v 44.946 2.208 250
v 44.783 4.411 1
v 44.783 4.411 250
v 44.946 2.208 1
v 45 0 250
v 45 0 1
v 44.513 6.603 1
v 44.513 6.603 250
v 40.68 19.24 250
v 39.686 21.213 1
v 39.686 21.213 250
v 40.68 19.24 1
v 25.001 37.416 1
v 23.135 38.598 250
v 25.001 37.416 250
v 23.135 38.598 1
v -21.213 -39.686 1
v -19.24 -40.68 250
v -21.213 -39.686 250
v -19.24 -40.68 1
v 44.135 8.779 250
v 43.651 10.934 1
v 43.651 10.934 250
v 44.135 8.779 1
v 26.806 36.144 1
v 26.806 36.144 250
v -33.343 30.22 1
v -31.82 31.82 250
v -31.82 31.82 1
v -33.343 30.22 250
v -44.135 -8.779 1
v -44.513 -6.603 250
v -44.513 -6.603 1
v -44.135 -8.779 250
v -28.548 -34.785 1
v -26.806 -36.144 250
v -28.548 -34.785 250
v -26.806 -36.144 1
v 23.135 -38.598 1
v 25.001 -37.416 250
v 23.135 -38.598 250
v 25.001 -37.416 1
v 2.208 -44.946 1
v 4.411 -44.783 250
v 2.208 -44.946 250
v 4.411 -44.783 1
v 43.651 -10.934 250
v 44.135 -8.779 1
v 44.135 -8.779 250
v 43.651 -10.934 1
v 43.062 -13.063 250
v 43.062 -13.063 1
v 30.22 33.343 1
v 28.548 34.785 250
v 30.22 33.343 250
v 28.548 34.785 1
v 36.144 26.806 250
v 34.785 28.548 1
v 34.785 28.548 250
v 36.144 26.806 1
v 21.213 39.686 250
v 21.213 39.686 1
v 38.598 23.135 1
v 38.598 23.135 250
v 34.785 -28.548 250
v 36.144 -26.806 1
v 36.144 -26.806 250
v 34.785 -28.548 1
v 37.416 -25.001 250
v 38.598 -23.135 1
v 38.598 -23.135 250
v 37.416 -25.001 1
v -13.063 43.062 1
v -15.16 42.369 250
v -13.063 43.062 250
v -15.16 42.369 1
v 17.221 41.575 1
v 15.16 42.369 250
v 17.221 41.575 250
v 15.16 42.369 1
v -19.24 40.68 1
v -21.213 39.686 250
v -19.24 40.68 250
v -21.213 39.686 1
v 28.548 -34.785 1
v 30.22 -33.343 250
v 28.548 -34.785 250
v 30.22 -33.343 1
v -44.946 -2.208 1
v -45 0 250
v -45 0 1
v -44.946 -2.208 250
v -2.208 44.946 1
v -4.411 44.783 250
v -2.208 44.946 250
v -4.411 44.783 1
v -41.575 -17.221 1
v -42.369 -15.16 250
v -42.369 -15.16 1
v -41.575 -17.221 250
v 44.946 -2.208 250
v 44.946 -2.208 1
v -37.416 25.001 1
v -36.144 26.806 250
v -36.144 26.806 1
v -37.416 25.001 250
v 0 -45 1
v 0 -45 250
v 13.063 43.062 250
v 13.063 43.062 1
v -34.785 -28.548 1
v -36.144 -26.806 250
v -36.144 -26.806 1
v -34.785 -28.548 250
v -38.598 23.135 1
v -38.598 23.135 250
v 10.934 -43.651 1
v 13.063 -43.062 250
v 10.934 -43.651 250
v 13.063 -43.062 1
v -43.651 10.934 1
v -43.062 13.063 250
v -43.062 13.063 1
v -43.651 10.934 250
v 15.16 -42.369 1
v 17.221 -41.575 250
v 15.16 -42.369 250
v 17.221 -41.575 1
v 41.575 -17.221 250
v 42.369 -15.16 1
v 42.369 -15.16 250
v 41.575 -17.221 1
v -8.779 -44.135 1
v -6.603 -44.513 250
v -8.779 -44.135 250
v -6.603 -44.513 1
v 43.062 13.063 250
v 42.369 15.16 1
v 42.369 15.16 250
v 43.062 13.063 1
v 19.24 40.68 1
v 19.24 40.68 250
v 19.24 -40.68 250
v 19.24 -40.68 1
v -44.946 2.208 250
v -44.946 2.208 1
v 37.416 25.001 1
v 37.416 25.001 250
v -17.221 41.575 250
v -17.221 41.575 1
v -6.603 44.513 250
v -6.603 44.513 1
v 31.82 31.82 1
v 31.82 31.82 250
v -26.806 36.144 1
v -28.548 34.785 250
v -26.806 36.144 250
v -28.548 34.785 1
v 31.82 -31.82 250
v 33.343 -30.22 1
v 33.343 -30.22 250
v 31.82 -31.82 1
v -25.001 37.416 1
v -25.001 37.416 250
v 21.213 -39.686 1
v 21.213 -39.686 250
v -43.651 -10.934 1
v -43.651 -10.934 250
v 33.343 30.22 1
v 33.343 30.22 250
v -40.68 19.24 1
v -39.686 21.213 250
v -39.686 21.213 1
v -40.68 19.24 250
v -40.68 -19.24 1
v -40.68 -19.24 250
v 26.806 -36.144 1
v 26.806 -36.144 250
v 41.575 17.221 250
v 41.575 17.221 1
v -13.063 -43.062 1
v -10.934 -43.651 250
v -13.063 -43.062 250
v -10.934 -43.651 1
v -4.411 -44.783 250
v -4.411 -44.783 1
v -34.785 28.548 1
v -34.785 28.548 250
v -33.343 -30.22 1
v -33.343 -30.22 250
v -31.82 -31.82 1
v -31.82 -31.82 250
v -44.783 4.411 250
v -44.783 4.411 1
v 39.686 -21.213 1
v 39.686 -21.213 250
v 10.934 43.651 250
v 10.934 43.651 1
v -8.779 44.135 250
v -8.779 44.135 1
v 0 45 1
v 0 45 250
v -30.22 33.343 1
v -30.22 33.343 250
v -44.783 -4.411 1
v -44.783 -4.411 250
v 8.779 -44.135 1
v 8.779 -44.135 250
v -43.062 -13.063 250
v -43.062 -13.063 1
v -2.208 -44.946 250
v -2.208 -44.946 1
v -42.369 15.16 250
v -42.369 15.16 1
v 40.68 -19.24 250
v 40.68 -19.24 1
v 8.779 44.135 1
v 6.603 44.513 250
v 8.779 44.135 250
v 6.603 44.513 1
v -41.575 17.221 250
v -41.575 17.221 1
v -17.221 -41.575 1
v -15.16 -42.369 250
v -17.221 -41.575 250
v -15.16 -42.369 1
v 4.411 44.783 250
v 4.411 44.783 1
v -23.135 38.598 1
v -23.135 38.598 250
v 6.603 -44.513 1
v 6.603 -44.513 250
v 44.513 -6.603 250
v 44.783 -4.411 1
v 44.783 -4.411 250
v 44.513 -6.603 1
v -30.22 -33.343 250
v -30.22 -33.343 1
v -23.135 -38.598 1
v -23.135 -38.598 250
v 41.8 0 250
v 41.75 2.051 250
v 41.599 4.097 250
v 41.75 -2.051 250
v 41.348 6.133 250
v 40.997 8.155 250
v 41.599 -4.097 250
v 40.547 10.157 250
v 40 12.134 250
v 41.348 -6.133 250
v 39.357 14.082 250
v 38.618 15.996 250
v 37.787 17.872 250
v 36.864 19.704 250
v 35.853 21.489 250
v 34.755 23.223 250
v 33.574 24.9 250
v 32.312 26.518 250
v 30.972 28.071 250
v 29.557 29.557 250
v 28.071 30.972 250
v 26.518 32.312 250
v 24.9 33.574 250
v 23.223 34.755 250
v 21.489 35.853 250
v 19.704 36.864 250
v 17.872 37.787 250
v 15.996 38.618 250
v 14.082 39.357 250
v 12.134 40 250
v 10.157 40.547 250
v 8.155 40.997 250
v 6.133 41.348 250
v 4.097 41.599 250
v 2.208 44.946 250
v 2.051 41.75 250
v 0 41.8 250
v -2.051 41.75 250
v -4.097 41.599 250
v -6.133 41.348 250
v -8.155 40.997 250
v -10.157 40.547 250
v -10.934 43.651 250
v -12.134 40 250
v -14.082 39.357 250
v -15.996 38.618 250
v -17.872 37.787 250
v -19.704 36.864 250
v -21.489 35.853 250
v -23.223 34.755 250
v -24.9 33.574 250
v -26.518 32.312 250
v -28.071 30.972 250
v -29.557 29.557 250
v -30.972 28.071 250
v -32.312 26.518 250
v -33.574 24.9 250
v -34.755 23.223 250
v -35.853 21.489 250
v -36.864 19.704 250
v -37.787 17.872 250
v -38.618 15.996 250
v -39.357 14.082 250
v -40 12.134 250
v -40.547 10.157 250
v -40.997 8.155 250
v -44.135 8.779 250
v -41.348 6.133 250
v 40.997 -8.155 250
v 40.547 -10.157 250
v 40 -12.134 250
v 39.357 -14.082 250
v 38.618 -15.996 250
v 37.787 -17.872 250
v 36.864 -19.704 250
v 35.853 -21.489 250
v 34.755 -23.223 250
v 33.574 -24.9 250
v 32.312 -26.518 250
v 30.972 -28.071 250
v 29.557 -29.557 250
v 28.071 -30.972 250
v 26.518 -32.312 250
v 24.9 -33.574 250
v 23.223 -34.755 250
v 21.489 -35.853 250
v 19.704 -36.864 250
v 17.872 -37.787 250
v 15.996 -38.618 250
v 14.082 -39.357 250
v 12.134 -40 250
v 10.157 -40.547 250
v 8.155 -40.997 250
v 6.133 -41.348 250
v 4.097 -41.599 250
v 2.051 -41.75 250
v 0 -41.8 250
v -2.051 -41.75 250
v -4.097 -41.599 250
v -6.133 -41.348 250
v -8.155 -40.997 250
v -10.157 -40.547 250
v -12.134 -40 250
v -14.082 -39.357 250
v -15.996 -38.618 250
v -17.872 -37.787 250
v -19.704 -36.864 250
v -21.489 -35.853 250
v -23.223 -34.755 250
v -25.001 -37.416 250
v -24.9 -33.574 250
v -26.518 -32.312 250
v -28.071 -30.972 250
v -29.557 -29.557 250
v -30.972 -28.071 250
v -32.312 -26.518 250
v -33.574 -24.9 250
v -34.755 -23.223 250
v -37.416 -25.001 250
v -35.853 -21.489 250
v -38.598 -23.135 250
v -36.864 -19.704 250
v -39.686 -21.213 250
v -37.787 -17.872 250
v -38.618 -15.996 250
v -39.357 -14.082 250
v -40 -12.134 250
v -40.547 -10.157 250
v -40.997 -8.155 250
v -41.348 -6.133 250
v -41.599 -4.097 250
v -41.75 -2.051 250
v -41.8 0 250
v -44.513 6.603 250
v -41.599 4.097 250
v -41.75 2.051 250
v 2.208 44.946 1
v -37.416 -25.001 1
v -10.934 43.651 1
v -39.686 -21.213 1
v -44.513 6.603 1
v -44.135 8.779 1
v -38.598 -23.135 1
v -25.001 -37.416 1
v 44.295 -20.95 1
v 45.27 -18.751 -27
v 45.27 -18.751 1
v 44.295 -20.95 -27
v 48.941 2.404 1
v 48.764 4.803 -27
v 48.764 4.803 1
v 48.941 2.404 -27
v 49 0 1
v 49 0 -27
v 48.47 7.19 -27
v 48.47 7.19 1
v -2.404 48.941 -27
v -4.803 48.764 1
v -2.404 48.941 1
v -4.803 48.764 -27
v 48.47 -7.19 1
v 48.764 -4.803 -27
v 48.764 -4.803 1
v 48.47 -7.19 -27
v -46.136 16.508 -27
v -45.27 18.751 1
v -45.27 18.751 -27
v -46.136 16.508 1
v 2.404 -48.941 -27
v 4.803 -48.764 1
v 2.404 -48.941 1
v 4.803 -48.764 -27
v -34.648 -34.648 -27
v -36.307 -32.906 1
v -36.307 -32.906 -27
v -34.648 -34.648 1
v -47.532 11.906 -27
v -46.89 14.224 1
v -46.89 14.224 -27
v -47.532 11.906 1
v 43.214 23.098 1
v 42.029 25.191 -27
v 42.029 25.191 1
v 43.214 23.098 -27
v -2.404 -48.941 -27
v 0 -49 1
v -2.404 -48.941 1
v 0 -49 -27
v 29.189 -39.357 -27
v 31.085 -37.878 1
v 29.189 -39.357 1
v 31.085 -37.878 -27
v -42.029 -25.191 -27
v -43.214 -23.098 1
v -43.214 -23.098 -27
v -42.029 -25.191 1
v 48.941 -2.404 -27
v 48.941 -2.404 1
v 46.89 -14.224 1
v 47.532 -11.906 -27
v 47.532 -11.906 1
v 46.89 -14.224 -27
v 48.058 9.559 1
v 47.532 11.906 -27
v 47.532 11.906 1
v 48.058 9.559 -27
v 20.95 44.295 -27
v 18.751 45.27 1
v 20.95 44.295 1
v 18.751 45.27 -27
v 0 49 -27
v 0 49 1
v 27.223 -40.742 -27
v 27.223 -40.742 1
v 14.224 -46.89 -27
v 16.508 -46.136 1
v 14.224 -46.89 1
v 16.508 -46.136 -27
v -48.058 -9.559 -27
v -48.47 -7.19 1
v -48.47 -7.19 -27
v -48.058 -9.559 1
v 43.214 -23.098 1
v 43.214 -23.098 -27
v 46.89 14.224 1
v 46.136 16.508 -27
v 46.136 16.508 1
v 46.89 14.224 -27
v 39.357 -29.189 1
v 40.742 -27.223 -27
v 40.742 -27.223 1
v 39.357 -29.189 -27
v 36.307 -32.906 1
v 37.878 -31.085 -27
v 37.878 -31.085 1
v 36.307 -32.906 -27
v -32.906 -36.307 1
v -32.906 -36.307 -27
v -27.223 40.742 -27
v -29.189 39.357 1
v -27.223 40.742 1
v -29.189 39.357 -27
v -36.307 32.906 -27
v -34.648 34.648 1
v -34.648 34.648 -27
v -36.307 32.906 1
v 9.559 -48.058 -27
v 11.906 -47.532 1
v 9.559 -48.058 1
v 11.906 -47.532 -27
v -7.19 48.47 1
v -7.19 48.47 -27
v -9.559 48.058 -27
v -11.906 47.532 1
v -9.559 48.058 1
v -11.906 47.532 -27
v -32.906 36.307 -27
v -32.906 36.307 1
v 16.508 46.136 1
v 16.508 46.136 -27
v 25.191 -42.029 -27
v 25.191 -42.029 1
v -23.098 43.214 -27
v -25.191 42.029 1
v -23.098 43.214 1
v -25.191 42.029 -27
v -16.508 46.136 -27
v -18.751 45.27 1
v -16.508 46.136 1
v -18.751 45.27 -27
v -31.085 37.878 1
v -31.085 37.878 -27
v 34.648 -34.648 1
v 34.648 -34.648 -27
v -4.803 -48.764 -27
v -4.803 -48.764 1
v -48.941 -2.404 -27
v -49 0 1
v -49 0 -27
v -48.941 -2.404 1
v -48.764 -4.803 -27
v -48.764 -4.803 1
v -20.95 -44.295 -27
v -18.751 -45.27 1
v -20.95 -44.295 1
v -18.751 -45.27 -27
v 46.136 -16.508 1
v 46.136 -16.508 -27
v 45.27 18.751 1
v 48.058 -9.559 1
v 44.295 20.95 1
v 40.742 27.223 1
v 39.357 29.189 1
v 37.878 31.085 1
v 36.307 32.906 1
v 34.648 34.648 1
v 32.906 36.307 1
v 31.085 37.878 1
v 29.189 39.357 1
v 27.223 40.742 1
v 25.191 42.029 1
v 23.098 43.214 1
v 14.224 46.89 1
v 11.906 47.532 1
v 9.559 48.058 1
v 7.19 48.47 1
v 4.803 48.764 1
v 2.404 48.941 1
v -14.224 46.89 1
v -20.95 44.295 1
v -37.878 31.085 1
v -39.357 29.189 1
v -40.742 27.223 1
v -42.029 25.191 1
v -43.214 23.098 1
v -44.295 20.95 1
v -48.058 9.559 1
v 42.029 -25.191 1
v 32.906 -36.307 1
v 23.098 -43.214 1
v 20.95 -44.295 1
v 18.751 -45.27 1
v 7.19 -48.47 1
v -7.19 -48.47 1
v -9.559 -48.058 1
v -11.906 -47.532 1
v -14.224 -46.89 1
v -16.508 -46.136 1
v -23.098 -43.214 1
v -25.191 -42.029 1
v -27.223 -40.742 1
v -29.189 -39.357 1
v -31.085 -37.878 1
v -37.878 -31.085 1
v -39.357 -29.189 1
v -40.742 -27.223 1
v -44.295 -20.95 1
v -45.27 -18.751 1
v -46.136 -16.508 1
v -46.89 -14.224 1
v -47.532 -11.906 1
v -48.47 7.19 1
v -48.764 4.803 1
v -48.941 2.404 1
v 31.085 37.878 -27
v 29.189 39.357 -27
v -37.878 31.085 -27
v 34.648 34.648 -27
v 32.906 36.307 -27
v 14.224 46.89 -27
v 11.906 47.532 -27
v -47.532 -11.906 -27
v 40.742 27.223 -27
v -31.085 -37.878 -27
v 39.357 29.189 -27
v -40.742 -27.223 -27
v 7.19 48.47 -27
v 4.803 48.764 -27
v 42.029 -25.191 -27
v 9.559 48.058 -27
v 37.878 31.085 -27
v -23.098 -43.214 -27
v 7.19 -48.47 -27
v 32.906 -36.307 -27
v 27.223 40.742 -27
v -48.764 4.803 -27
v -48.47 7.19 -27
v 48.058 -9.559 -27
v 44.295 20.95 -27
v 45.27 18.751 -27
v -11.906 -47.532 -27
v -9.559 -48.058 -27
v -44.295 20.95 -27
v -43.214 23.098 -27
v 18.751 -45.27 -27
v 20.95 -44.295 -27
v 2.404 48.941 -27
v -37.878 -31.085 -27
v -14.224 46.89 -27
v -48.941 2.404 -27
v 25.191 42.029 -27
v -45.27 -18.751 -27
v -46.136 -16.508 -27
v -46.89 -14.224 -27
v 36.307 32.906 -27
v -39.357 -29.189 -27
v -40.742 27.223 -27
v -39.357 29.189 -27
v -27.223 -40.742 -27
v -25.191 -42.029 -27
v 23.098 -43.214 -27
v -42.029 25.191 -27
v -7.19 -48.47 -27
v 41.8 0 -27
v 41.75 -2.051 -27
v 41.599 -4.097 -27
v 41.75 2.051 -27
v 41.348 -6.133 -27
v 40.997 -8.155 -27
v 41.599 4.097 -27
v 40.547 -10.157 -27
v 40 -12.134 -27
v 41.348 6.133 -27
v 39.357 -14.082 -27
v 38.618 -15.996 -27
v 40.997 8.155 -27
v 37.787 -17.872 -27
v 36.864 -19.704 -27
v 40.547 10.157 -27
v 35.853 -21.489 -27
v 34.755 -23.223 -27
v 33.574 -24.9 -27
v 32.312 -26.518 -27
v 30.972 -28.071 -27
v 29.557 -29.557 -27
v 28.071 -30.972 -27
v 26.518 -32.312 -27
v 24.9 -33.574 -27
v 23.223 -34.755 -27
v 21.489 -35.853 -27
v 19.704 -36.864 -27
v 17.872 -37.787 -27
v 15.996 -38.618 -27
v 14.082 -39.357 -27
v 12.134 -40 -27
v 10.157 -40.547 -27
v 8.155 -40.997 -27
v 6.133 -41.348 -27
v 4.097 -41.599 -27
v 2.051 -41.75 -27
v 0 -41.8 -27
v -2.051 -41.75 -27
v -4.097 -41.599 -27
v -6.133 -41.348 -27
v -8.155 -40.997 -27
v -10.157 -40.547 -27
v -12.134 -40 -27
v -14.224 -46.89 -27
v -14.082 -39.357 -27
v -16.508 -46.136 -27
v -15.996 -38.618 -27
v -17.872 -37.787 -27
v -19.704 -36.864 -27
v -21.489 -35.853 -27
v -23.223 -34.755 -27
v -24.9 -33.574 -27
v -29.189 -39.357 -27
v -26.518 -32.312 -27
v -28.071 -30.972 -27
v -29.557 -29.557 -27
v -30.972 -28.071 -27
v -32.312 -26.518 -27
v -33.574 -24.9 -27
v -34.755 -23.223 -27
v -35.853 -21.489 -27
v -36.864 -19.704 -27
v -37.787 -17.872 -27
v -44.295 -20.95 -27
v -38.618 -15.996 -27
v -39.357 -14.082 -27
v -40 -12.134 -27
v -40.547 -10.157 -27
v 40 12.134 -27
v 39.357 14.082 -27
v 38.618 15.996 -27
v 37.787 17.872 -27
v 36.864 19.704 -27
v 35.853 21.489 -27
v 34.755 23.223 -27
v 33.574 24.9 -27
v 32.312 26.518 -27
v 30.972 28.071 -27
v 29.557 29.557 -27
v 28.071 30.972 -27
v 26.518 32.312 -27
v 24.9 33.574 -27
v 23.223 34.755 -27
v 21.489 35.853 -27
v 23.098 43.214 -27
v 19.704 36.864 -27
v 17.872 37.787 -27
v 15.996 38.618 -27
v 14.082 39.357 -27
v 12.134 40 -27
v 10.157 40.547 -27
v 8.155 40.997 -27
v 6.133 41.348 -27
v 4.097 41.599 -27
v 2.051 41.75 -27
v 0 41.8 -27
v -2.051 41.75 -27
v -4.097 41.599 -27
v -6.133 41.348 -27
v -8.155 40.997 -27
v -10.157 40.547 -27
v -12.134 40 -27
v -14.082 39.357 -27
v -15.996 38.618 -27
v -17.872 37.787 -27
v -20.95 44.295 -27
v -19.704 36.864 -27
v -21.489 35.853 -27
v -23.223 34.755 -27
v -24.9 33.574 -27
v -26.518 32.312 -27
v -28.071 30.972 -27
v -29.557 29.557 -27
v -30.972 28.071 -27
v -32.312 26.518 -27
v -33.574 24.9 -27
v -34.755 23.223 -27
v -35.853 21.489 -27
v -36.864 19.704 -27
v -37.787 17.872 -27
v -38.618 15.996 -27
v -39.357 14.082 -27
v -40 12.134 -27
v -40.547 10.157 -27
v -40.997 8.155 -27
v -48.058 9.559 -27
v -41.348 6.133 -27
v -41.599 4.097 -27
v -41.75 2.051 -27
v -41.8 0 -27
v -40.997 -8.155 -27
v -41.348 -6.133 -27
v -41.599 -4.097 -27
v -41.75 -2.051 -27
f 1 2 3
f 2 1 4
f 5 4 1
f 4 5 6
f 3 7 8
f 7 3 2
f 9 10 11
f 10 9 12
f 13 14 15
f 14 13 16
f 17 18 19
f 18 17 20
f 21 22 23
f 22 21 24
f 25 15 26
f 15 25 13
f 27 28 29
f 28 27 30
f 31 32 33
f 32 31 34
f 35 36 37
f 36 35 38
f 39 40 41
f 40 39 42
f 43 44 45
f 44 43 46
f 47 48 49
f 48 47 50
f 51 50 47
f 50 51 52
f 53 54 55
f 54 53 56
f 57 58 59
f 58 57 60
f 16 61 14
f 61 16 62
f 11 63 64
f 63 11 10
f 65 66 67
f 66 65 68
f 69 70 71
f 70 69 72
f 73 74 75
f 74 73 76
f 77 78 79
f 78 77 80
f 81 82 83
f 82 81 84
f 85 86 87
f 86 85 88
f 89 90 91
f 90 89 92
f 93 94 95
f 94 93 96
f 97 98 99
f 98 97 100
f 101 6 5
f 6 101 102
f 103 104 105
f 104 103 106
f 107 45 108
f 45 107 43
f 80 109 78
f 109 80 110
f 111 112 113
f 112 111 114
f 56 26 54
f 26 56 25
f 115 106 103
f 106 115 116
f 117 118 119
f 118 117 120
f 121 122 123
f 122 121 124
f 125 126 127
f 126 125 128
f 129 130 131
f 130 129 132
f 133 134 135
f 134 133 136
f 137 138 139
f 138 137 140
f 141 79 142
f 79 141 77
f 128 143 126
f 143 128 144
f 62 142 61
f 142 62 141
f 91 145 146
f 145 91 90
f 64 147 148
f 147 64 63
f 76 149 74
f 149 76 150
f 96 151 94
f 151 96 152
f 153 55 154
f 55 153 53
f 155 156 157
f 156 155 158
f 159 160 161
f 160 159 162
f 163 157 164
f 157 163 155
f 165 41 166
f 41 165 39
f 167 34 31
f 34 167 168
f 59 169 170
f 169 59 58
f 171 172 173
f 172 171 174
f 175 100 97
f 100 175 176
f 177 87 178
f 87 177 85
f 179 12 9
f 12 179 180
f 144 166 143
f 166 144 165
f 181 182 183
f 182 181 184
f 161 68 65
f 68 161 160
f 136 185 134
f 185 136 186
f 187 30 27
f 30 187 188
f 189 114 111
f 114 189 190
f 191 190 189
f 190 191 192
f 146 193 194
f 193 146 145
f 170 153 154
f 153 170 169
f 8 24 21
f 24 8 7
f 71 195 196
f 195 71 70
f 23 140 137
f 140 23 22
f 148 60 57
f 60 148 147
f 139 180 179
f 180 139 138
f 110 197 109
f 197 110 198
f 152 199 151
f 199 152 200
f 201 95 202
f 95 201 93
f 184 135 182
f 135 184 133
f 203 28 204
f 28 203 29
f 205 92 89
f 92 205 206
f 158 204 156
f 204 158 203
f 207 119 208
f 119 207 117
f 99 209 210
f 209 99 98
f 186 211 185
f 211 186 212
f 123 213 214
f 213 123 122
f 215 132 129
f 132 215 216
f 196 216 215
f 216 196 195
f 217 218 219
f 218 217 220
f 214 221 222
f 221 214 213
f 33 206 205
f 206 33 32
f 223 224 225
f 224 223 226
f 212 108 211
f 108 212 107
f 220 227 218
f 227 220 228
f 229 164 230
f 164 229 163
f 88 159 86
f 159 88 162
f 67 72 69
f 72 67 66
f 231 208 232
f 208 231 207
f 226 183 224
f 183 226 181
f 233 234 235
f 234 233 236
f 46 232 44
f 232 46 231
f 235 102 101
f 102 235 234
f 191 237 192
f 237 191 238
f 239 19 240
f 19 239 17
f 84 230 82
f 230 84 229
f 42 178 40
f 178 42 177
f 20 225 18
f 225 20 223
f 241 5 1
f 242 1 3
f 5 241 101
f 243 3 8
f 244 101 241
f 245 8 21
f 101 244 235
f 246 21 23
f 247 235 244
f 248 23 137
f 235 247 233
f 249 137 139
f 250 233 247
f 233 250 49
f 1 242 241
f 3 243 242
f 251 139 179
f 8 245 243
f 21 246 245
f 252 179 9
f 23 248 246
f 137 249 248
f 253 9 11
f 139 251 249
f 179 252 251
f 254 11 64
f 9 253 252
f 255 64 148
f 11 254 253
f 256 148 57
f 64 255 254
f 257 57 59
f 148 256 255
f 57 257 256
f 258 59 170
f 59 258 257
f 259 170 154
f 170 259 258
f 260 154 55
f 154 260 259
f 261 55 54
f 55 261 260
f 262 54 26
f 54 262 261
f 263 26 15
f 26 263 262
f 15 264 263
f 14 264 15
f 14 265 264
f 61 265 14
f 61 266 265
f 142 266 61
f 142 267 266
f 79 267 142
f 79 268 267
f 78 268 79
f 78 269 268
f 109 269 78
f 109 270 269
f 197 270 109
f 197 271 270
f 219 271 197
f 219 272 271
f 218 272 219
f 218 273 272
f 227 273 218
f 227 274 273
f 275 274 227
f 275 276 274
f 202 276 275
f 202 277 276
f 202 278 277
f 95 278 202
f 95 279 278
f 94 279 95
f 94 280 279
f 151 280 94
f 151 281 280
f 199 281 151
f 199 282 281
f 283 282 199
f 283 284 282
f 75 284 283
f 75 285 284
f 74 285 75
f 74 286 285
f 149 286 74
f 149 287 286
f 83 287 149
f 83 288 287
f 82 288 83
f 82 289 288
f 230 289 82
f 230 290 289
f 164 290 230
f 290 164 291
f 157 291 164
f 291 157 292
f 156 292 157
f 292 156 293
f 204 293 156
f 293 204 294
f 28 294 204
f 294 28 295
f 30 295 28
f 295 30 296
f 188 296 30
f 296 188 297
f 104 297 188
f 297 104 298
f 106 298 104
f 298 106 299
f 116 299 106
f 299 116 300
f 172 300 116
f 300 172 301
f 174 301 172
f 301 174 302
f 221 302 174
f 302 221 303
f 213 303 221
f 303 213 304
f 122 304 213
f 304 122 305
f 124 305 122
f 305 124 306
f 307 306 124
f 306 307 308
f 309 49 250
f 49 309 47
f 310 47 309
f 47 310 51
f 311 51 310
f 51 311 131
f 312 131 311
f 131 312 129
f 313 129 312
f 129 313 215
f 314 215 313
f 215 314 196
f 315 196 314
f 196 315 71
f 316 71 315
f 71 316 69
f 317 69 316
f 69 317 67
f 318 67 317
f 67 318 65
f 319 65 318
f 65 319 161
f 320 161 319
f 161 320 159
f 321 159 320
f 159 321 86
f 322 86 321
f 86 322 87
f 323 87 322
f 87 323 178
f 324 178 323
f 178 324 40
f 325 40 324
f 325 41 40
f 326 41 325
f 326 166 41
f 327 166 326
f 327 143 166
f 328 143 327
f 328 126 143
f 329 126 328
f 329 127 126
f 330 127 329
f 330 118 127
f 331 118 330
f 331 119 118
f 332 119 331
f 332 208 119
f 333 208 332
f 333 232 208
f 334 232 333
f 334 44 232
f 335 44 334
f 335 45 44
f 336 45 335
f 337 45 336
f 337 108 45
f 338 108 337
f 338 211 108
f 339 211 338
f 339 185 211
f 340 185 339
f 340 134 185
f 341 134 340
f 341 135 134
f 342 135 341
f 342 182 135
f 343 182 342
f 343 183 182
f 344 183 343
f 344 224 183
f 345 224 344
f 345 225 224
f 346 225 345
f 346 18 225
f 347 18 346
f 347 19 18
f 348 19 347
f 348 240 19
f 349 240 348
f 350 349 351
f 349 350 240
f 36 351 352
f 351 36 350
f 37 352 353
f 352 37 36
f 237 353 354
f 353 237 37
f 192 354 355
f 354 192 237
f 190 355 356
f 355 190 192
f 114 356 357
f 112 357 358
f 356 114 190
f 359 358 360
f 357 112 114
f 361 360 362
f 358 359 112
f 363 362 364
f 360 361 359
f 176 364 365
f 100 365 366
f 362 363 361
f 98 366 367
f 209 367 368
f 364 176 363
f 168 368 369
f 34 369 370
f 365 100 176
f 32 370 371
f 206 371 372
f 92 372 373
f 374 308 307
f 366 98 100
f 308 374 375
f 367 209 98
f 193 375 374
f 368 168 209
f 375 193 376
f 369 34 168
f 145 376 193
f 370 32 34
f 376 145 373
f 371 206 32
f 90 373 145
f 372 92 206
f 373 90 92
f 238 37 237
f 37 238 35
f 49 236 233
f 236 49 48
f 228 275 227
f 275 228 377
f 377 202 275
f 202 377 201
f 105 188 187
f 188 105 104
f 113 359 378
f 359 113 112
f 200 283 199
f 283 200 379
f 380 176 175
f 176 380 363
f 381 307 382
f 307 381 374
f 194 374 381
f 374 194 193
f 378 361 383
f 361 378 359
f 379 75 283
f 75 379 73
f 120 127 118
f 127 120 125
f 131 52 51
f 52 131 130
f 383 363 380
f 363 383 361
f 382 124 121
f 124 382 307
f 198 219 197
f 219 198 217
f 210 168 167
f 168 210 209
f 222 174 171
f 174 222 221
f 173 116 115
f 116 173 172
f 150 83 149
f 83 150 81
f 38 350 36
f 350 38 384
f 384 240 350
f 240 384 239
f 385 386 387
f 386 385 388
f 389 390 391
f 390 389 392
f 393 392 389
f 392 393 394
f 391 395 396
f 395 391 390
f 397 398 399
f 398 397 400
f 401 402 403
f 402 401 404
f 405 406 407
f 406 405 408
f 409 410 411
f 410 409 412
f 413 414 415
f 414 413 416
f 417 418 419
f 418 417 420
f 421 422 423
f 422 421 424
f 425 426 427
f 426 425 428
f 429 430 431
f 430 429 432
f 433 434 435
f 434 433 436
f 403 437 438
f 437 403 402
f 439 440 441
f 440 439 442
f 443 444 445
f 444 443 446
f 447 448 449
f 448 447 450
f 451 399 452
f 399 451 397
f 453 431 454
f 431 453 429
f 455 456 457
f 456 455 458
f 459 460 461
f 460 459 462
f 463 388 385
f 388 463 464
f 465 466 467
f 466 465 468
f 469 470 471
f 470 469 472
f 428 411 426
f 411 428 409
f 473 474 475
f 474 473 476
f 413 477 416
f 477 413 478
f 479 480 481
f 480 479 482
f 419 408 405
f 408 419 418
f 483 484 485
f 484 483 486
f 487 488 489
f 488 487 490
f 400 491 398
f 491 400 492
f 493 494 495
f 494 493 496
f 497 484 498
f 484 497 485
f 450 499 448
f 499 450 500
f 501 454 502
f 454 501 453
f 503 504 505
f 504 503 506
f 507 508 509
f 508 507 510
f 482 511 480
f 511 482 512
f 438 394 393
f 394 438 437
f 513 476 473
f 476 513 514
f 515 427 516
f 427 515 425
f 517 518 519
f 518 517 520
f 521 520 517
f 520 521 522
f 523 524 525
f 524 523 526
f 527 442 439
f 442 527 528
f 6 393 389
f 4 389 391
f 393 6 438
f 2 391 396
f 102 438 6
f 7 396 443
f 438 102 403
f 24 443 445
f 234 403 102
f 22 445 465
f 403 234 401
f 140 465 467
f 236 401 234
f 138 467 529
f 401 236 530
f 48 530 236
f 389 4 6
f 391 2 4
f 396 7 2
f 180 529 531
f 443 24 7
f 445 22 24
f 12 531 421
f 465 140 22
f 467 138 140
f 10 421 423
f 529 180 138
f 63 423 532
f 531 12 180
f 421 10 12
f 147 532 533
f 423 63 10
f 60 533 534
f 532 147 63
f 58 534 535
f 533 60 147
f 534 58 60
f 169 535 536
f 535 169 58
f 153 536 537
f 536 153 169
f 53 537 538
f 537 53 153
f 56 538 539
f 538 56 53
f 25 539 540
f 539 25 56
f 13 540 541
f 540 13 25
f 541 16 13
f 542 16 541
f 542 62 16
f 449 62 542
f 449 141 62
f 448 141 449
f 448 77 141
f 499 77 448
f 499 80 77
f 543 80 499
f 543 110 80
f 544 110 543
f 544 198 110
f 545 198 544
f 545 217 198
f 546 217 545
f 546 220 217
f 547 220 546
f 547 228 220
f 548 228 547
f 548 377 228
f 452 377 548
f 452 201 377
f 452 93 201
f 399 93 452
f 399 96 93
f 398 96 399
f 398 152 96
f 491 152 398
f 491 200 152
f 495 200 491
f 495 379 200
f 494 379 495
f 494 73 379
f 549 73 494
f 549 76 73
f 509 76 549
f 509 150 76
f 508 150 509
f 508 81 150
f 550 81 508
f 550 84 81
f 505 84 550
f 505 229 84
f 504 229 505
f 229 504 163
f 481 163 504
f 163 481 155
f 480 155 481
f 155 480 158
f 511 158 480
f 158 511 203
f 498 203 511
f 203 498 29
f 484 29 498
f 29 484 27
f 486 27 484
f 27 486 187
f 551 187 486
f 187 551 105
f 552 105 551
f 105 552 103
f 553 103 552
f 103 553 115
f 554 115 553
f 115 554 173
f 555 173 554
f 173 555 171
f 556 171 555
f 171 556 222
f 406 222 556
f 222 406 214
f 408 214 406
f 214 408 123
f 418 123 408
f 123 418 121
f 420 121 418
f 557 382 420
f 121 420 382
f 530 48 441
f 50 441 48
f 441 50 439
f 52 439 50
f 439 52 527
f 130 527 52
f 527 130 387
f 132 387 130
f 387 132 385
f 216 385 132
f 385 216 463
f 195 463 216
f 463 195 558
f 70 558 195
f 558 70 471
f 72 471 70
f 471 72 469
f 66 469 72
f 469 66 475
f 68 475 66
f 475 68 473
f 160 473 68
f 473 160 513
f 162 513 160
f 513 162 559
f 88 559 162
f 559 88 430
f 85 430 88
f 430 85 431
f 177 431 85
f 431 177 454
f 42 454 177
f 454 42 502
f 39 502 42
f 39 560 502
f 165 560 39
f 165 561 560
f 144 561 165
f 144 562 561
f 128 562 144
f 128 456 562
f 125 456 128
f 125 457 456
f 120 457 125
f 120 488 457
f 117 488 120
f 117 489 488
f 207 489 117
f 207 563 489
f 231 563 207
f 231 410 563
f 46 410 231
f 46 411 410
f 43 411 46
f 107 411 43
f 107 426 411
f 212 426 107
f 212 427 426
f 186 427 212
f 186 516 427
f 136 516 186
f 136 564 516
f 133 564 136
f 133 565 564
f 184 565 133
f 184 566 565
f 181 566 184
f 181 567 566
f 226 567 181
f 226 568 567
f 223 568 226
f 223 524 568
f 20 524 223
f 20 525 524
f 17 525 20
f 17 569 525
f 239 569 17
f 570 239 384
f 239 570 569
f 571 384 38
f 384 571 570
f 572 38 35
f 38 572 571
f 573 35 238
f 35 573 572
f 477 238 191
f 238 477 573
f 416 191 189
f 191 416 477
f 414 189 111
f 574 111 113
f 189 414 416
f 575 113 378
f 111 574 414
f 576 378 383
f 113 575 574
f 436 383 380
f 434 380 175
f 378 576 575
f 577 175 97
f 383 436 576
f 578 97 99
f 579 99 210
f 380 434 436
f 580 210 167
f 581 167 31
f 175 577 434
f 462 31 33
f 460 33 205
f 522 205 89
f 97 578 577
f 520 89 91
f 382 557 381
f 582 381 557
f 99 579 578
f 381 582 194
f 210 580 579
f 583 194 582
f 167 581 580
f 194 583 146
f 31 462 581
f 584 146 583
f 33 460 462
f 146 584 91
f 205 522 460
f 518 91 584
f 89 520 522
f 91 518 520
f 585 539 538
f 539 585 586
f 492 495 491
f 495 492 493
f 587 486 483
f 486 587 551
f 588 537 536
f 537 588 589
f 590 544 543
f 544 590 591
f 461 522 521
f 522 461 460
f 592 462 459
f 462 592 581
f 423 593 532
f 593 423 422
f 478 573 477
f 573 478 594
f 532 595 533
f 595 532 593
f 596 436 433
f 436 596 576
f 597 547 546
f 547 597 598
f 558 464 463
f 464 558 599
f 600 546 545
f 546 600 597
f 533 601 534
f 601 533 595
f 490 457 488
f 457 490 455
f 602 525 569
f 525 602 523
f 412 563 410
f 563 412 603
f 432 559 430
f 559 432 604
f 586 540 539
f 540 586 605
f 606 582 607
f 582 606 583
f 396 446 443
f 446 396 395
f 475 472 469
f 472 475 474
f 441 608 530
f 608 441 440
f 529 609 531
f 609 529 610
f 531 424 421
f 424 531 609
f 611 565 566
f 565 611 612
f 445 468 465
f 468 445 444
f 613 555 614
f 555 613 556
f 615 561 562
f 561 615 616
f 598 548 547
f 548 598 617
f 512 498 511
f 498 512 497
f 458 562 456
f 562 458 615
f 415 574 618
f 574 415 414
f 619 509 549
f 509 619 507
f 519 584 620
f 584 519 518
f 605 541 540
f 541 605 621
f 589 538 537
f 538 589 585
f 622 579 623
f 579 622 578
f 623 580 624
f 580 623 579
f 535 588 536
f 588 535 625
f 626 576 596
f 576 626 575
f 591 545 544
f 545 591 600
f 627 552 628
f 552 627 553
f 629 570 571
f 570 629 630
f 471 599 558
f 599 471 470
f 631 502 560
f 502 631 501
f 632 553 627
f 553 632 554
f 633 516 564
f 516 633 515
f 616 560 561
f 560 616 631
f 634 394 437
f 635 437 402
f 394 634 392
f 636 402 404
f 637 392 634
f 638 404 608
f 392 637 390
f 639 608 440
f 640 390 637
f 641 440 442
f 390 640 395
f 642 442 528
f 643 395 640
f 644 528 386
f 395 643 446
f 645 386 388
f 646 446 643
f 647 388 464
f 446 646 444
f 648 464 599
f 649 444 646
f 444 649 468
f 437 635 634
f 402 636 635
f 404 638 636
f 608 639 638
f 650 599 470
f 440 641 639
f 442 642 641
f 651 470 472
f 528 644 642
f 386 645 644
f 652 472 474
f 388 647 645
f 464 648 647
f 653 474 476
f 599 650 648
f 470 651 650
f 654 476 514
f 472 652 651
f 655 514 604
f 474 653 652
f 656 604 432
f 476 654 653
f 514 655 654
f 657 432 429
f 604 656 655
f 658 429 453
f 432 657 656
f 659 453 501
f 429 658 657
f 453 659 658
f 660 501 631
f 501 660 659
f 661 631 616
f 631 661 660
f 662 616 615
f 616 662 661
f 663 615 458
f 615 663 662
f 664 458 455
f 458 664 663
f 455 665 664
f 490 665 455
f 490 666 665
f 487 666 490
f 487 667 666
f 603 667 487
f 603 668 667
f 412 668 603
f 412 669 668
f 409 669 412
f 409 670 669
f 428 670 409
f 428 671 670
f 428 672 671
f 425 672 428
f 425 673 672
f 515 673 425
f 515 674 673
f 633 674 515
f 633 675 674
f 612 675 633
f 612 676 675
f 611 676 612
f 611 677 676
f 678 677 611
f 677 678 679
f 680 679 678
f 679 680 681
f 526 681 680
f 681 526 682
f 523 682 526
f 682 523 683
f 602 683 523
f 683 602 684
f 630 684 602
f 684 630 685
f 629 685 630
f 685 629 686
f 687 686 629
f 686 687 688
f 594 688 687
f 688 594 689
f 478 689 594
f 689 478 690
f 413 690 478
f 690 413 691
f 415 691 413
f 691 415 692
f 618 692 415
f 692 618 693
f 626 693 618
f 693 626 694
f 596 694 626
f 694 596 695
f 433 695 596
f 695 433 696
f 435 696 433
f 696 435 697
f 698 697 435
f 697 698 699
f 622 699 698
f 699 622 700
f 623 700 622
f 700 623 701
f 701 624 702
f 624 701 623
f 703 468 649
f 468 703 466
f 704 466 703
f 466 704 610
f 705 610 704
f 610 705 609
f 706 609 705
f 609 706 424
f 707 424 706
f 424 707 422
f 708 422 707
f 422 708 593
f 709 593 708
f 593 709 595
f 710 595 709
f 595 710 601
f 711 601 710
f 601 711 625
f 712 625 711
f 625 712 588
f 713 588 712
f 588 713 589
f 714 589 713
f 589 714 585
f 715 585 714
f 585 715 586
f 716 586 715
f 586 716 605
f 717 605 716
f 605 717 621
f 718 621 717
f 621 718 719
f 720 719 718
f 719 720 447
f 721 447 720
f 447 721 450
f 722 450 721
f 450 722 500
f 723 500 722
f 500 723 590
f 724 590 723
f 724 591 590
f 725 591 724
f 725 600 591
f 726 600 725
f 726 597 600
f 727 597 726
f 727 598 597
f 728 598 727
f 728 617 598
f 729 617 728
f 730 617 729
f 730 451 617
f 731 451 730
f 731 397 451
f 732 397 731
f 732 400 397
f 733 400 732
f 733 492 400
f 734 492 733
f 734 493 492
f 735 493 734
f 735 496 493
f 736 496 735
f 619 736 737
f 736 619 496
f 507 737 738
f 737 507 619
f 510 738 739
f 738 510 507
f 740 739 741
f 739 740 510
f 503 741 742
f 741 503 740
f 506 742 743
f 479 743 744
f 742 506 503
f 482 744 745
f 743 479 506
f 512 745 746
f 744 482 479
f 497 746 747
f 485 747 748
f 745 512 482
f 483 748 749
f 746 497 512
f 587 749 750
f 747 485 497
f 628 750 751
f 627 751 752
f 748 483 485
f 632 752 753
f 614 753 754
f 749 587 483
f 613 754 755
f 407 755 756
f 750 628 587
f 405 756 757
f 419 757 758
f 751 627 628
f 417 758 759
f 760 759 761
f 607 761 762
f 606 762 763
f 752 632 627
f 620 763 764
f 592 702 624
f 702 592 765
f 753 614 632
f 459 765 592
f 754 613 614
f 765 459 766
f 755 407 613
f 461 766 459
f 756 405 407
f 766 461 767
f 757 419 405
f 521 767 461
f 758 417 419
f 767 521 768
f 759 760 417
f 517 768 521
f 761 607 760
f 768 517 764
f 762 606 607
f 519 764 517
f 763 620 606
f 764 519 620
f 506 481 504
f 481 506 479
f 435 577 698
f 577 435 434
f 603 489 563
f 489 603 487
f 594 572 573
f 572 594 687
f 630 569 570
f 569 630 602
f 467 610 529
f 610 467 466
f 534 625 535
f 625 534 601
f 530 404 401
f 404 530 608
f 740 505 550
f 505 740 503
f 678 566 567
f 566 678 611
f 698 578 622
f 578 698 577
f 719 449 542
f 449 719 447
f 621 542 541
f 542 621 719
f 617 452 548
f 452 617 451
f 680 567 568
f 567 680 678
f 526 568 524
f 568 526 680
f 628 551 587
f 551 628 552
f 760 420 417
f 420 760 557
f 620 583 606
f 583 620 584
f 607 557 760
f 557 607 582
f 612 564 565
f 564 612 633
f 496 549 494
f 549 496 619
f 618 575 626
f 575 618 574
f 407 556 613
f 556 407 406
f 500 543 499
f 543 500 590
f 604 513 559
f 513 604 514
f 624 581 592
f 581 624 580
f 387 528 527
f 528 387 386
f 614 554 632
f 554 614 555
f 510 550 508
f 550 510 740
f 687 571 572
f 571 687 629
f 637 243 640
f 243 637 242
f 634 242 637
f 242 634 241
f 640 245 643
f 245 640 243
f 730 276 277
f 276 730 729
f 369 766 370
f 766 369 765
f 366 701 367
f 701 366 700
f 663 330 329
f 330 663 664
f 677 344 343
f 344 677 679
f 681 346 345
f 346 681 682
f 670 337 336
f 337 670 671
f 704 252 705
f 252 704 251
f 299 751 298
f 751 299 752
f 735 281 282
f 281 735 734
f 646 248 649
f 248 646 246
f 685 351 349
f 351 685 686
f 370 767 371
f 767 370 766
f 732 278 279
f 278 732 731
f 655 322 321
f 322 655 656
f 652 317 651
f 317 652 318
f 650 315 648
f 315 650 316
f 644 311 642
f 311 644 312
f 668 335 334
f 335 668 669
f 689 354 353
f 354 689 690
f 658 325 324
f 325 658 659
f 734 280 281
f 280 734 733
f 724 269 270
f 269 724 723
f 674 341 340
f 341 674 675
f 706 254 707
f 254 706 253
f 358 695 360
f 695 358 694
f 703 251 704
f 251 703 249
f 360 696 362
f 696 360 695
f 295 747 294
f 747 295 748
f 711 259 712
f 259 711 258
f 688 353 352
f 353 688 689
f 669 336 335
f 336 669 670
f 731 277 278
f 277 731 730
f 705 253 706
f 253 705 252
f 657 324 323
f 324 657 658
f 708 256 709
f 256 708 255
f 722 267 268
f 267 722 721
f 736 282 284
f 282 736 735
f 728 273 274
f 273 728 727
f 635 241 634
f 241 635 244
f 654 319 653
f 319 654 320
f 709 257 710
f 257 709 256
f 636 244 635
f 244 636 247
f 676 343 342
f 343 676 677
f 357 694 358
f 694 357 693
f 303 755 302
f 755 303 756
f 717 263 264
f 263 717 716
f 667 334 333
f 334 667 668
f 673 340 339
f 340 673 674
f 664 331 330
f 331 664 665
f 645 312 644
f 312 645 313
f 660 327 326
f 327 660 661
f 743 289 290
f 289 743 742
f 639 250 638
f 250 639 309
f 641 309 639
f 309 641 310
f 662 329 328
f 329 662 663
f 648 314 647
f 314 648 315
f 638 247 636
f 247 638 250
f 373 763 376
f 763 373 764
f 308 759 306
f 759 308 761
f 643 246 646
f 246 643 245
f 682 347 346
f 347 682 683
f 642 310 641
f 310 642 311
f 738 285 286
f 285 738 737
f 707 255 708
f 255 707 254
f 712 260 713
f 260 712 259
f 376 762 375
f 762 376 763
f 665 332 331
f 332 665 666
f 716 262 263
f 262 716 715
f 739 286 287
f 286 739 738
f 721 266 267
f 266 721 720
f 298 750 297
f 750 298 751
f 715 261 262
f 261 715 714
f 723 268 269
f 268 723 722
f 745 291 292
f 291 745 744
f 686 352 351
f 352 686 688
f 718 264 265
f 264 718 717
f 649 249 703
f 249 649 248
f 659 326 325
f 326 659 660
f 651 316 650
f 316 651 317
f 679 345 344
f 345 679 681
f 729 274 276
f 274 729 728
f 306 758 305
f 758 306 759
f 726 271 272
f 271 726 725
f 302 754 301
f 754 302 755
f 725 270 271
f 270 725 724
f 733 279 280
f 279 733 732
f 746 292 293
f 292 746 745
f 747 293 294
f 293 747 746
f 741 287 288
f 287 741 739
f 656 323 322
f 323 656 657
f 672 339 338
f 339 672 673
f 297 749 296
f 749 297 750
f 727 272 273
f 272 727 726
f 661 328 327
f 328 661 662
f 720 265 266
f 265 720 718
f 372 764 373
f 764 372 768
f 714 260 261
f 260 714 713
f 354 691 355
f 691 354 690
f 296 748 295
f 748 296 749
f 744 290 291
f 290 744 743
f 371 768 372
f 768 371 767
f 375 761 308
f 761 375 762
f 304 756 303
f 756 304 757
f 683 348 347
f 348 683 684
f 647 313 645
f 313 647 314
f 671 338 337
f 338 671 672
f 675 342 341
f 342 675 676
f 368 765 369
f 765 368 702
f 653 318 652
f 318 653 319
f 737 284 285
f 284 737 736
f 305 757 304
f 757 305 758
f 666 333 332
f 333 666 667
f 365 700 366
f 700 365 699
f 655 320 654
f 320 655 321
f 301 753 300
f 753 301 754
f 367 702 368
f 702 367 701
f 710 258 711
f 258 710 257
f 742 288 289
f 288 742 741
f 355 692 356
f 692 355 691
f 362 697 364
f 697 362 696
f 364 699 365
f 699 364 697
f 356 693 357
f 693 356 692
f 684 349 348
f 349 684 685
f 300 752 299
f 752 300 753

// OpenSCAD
$fn = 128;

// Parameters
nominal_diameter_mm = 90;      //[45:180:1]
length_mm = 250;               //[125:500:1]
wall_thickness_mm = 3.2;       //[1.6:6.4:0.1]
fitting_length_mm = 28;        //[14:56:1]
fitting_radial_add_mm = 4;     //[2:8:0.5]
overlap_mm = 1;                //[0.5:2:0.1]

// Derived
outer_r = nominal_diameter_mm/2;
inner_r = outer_r - wall_thickness_mm;
socket_outer_r = outer_r + fitting_radial_add_mm;

// HT Pipe - one connected solid
module ht_pipe() {
  color([0.85, 0.85, 0.8])
  difference() {
    // OUTER: main pipe + socket, socket overlaps into main pipe by overlap_mm
    union() {
      cylinder(h=length_mm, r=outer_r, center=false);

      // Socket at bottom end, extends below 0 and overlaps into main pipe
      translate([0, 0, -fitting_length_mm + overlap_mm])
        cylinder(h=fitting_length_mm, r=socket_outer_r, center=false);
    }

    // INNER VOID: continuous bore through entire length + socket region
    translate([0, 0, -fitting_length_mm - overlap_mm])
      cylinder(h=length_mm + fitting_length_mm + overlap_mm*2, r=inner_r, center=false);
  }
}

ht_pipe();
